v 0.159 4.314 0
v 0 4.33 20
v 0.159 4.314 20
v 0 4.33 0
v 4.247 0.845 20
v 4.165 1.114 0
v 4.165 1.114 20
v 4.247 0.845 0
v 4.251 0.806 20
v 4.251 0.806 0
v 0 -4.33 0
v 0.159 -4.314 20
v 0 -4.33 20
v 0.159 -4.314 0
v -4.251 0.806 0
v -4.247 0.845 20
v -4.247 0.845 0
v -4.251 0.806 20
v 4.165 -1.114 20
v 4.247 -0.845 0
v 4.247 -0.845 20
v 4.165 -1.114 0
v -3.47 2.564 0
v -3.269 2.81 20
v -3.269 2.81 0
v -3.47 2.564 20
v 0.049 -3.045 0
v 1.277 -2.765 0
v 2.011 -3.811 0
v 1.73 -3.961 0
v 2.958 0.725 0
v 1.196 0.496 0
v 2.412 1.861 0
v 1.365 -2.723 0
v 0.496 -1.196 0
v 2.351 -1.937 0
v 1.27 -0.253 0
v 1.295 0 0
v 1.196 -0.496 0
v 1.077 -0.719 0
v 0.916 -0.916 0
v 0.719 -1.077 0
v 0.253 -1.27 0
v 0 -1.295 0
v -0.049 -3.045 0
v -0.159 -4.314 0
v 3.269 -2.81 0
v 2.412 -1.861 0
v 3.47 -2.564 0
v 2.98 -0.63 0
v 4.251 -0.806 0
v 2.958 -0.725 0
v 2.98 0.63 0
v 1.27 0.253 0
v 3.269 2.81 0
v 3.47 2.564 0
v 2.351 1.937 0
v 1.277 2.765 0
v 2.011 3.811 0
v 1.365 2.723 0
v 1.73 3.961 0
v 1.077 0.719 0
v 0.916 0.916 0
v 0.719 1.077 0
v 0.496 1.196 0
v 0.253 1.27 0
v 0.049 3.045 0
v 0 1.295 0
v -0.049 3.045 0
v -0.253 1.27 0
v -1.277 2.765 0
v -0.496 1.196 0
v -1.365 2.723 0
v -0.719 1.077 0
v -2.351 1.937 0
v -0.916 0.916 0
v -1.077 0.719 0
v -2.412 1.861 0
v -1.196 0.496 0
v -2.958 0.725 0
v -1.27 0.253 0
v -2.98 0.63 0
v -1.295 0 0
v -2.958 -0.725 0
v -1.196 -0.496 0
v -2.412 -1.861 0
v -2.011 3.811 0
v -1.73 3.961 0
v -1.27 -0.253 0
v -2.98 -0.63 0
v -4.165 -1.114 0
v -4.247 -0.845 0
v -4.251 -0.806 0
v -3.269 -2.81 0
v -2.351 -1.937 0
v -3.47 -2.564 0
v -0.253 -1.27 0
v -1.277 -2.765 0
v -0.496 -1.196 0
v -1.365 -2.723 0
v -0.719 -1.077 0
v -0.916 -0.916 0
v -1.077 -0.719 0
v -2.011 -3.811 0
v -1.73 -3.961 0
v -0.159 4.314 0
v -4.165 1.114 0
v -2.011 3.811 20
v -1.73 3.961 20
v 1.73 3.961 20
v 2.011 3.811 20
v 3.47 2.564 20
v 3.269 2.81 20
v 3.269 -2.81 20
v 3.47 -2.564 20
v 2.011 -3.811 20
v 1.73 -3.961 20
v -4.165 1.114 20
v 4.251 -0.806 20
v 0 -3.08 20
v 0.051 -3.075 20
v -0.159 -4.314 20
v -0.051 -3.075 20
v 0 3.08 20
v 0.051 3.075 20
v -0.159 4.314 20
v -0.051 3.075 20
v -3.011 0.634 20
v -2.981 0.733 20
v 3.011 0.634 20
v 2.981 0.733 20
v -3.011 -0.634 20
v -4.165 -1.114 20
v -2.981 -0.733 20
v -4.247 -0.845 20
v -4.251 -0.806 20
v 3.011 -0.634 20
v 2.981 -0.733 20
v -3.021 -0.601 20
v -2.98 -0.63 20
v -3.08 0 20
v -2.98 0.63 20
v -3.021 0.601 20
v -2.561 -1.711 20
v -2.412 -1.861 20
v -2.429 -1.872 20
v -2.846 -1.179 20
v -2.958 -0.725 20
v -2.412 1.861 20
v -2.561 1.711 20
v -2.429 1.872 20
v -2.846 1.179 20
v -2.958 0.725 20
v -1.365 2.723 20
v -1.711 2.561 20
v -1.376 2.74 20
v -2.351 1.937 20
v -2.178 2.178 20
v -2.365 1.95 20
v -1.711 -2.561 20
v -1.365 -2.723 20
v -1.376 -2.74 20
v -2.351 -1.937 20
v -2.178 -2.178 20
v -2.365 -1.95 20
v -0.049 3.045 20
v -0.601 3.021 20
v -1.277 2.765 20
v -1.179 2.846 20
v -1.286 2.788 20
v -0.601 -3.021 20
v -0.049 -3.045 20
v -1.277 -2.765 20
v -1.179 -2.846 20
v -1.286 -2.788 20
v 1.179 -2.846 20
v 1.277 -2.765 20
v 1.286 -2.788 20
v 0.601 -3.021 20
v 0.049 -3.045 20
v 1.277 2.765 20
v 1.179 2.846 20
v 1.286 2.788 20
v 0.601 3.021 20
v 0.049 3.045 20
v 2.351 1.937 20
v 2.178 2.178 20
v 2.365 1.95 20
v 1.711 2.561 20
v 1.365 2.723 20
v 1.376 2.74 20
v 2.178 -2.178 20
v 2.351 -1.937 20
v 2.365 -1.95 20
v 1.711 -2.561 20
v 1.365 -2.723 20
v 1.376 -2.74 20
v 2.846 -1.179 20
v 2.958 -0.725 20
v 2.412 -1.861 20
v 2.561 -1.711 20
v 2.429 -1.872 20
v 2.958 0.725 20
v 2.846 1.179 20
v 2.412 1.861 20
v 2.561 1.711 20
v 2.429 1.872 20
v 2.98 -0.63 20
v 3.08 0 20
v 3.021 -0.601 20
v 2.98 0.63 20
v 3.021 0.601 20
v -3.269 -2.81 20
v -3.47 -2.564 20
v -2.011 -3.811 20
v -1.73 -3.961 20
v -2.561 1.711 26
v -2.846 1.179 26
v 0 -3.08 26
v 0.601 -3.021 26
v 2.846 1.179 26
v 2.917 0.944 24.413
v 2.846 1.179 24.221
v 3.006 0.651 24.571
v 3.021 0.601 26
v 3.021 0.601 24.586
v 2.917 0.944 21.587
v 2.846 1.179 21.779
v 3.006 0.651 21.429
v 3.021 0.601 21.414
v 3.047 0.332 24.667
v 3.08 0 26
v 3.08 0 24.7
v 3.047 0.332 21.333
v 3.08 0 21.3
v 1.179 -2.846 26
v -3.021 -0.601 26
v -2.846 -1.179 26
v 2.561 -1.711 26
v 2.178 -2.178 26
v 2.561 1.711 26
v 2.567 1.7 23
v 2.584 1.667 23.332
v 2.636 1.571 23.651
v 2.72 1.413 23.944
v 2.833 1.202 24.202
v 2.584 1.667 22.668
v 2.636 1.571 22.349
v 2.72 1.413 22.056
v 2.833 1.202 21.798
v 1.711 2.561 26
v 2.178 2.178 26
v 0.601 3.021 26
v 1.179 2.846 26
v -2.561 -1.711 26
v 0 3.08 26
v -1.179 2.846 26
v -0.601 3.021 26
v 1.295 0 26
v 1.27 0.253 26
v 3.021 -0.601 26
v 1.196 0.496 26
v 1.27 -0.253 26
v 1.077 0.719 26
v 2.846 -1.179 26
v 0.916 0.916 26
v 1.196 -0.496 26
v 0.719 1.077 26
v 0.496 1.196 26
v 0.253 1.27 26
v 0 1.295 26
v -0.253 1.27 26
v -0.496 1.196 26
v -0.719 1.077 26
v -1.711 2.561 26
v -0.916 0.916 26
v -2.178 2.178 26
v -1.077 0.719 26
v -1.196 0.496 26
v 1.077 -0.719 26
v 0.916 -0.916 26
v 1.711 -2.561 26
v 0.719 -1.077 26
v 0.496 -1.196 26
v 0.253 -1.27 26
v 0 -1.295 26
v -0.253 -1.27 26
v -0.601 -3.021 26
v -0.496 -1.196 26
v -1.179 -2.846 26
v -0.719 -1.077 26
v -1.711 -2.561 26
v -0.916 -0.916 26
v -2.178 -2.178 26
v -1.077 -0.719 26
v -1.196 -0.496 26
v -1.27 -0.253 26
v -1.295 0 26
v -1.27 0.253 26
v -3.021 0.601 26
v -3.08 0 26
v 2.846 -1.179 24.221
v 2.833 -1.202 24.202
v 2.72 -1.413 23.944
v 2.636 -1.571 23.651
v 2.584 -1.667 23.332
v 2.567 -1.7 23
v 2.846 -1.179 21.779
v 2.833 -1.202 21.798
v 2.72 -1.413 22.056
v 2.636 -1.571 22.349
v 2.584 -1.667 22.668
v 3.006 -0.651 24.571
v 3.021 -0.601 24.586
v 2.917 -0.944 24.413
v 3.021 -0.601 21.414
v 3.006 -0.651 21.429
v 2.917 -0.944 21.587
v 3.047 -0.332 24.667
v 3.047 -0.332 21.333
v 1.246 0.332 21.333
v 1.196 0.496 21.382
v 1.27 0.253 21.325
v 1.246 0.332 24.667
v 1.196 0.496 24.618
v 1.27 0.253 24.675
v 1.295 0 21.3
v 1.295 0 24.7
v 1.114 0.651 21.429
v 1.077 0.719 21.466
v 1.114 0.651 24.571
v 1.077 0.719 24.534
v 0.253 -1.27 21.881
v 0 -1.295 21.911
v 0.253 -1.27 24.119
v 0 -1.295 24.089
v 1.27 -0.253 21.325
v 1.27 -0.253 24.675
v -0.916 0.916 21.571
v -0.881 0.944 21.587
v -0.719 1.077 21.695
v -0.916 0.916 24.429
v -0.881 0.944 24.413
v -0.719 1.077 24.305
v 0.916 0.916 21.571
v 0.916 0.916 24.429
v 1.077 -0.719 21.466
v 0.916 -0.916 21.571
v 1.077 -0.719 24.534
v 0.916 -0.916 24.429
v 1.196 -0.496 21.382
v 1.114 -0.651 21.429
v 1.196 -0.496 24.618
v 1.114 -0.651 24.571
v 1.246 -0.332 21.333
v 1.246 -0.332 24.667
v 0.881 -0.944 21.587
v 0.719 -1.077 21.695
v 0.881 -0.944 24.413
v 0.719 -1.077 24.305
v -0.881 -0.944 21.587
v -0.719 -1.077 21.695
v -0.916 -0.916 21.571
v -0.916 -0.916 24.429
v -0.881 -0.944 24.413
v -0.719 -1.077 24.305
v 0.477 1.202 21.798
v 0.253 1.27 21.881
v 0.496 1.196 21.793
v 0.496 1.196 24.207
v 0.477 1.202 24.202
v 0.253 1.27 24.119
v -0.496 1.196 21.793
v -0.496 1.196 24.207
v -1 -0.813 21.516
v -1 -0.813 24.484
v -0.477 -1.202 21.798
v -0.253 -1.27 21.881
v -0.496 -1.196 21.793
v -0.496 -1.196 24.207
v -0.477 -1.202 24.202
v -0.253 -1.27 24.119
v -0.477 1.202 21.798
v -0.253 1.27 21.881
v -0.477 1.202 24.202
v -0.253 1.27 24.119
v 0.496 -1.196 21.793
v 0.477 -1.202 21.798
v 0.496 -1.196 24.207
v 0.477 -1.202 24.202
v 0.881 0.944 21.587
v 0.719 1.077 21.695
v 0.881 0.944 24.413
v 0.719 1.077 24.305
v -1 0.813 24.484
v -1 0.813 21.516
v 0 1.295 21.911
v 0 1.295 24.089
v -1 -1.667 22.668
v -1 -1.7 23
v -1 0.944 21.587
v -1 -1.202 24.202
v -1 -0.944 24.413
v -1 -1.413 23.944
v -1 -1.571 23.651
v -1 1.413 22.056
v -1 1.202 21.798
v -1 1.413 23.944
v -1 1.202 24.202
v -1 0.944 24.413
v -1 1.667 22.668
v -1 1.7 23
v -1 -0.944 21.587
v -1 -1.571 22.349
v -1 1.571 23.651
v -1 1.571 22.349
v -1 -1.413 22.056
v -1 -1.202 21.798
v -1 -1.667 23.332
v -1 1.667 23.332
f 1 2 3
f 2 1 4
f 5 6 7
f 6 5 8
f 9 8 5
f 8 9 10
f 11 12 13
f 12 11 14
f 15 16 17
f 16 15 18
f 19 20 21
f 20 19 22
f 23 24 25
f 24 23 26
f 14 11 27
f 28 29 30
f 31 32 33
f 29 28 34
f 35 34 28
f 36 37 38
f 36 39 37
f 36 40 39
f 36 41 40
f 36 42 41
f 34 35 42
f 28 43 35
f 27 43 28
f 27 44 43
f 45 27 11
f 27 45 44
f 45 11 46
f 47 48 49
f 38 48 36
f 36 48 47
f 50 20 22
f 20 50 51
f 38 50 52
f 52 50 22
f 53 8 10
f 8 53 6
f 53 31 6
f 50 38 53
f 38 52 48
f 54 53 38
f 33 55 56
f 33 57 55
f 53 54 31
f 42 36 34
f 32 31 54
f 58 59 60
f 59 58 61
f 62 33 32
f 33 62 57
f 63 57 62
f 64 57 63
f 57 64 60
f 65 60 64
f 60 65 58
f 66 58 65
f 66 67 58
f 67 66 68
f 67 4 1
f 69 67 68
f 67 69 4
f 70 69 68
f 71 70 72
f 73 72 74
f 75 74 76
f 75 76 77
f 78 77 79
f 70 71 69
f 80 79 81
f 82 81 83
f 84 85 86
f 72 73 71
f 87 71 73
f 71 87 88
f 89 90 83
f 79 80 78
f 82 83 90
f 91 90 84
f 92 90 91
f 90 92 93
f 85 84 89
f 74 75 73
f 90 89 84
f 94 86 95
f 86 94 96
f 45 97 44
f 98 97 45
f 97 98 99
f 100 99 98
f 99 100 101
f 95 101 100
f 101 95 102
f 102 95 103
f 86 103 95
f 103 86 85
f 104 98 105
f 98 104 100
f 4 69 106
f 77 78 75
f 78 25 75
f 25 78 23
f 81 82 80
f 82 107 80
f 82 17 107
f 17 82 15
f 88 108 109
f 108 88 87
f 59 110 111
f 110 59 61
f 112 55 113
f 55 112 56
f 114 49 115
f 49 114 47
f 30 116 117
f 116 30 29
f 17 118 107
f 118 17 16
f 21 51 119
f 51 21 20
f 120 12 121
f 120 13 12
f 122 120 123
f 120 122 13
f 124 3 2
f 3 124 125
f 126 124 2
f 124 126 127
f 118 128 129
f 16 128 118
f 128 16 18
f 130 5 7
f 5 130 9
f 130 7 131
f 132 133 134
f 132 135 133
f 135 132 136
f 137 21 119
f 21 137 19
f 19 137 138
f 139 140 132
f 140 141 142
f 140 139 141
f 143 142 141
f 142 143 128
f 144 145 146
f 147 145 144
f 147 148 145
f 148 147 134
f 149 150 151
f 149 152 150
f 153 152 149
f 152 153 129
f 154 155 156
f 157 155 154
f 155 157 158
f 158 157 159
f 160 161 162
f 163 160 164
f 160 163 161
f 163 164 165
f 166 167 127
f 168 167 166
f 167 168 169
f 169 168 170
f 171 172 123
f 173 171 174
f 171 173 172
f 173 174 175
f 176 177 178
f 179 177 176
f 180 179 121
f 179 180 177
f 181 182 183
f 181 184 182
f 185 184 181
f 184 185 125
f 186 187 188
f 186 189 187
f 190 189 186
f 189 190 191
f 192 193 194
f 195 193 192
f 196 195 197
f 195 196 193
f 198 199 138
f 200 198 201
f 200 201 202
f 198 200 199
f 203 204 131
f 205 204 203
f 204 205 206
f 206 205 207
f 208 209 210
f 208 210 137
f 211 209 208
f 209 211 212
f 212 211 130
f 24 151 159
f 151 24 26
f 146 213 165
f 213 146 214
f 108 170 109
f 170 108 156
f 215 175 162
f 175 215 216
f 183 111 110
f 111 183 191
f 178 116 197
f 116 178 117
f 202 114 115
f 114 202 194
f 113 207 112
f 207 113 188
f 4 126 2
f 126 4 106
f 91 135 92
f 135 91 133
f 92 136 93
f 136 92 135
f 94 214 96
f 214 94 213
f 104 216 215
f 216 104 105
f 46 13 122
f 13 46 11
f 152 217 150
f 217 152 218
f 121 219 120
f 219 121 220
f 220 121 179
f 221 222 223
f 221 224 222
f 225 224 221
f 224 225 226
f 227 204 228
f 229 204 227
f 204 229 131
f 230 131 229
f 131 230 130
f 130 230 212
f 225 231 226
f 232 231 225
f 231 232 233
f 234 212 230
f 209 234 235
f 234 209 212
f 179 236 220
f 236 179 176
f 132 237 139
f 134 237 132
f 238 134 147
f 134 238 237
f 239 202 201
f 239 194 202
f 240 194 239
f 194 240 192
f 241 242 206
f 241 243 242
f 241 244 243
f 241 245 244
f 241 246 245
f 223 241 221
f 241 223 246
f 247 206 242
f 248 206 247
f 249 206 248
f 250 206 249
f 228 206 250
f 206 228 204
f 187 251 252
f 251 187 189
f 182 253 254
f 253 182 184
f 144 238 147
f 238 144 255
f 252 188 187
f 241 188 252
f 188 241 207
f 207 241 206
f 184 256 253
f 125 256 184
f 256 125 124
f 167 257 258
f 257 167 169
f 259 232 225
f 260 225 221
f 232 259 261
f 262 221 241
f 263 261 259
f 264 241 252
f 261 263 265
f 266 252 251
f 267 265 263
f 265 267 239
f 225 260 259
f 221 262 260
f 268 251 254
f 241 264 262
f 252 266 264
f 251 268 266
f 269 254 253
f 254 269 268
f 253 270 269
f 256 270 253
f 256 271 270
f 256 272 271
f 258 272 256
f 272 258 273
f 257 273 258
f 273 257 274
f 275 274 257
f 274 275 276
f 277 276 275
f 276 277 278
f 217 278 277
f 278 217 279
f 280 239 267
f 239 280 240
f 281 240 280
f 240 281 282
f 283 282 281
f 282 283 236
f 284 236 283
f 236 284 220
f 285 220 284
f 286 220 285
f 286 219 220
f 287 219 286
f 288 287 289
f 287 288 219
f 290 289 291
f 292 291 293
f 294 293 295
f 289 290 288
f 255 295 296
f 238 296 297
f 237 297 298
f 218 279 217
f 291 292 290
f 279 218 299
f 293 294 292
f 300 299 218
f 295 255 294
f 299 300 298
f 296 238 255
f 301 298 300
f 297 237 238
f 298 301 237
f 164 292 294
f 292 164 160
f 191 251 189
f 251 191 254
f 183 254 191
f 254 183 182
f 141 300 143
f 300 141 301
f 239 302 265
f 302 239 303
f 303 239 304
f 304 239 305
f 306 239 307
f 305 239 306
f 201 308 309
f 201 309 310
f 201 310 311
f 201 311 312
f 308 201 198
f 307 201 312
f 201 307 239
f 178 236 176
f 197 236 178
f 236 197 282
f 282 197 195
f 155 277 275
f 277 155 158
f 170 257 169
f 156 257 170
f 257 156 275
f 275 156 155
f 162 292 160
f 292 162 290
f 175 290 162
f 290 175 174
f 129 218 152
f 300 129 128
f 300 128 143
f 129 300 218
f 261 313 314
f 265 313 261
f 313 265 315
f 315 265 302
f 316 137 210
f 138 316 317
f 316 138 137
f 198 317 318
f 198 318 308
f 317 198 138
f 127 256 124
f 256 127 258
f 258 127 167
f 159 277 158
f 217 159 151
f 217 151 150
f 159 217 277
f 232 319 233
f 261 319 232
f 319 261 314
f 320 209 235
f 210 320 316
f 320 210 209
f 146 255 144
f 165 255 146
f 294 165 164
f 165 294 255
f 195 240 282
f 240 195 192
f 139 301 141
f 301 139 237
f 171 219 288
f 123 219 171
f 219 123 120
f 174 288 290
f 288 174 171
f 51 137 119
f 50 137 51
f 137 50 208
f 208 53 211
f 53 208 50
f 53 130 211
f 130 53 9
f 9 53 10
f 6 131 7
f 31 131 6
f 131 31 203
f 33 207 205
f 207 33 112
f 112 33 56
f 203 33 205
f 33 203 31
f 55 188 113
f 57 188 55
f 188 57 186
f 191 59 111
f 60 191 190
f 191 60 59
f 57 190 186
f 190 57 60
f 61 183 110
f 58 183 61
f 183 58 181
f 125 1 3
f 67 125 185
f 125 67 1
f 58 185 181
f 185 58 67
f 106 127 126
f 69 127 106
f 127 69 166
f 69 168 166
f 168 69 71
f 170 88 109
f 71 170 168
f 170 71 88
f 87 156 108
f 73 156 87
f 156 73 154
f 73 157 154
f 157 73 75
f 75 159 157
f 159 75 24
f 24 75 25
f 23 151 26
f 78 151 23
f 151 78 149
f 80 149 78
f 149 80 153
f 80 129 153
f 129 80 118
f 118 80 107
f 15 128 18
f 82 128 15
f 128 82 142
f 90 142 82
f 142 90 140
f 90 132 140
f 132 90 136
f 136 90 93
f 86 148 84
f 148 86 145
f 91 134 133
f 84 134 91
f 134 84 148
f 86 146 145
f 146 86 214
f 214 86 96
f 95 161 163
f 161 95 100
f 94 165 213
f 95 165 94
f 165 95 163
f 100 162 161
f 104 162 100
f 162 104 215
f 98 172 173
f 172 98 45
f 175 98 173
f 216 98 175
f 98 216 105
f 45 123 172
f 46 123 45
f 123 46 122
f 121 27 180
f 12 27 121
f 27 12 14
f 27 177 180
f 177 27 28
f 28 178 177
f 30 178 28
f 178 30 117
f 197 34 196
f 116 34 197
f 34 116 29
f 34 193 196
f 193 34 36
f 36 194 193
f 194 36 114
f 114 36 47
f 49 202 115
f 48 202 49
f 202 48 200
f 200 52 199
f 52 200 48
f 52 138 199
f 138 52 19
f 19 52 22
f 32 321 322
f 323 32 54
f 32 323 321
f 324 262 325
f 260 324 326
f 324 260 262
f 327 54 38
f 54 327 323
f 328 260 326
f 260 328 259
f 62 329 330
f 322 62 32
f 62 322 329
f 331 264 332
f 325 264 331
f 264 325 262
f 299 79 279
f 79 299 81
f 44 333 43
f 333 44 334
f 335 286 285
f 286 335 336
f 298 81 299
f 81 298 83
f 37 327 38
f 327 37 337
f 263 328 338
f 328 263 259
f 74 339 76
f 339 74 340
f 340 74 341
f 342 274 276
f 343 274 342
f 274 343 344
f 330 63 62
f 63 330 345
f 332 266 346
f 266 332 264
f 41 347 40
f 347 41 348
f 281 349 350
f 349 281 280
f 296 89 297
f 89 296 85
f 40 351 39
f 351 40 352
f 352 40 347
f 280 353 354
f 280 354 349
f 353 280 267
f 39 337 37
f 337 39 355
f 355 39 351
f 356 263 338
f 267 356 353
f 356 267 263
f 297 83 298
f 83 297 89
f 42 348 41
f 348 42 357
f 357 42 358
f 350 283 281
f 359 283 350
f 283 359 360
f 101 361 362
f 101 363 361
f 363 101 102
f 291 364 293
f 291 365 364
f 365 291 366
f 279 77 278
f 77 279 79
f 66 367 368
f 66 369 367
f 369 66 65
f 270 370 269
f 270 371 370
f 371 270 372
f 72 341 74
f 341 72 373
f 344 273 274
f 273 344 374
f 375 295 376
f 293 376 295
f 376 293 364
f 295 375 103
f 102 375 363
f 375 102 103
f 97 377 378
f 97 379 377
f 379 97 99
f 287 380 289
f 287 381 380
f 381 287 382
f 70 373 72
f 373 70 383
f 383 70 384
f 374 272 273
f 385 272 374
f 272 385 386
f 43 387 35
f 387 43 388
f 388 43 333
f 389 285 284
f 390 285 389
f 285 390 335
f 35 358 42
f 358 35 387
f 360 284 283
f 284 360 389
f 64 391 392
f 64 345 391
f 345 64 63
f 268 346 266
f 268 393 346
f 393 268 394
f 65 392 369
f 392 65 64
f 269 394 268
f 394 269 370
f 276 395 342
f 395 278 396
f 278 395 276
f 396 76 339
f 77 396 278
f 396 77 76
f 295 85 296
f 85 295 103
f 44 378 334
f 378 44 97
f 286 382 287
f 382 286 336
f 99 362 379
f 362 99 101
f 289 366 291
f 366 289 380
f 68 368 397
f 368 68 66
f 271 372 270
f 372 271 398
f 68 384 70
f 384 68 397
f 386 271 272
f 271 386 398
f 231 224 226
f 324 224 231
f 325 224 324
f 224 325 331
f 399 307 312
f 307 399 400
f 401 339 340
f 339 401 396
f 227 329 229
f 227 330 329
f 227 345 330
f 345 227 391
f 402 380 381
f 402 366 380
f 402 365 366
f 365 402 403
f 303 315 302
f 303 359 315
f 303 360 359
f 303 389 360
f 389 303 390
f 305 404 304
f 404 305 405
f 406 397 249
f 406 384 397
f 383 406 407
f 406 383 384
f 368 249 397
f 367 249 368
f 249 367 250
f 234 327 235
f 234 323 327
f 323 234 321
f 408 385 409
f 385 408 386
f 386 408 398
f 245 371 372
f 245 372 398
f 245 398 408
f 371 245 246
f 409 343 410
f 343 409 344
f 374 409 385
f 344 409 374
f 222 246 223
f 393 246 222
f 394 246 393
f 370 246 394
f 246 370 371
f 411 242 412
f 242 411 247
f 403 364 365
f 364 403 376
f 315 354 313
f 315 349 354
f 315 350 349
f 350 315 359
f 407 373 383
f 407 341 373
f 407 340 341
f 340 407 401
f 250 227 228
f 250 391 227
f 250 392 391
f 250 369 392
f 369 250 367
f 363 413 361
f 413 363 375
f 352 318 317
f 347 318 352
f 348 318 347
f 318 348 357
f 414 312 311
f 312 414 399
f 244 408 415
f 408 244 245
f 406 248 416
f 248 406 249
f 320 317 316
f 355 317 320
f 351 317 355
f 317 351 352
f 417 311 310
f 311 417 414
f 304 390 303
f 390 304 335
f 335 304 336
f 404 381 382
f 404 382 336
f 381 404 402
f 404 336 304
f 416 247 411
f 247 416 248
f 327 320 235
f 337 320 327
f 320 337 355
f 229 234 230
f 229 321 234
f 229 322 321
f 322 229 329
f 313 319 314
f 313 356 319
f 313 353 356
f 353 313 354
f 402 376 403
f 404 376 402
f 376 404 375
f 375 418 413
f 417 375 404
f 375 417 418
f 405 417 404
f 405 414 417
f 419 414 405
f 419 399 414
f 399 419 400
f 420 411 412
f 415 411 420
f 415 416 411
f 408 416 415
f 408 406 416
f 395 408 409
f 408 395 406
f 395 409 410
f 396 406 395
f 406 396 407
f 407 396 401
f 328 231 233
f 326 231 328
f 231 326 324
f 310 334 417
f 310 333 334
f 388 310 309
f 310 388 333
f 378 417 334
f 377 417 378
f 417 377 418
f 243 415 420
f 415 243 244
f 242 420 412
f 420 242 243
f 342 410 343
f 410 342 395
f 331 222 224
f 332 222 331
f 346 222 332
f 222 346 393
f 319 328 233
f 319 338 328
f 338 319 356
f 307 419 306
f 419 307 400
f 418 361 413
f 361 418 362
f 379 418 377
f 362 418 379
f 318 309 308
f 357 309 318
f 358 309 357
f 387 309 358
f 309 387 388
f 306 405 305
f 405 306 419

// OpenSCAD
$fn = 32;

// ----------------------------------------------------------------------
// Timing pulley: GT2 14T, pitch 2 mm, 8.66 mm x 26 mm
// ----------------------------------------------------------------------

// --- parameters (mm) ---
pitch_mm = 2;             // belt pitch
tooth_count = 14;         // number of grooves
width = 20;               // belt width between the flanges
tip_d = 8.66;             // tip circle diameter
root_d = 7.16;            // groove bottom diameter
groove_h = 0.75;          // groove depth
tooth_w = 1.5;            // groove width at the tip circle
hub_bore = 2.59;          // shaft bore
hub_d = 6.16;             // hub diameter
hub_h = 6;                // hub above the flange
bottom_z = 0;             // lowest point of the pulley
top_z = 26;               // highest point of the pulley
set_d = 3.4;              // set screw tap hole

module rim() {
  cylinder(h = width, d = tip_d);
}

module groove_cutter() {
  /* belt tooth groove: deeper than wide, cut through the belt width */
  translate([root_d / 2, 0, 0])
    linear_extrude(height = width)
      polygon(points = [[-0.6, -tooth_w * 0.42], [groove_h + 0.6, -tooth_w * 0.6],
                        [groove_h + 0.6, tooth_w * 0.6], [-0.6, tooth_w * 0.42]]);
}

module hub() {
  translate([0, 0, bottom_z]) cylinder(h = top_z - bottom_z, d = hub_d);
}

difference() {
  union() {
    rim();
    hub();
  }
  for (i = [0 : tooth_count - 1]) rotate([0, 0, i * 360 / tooth_count]) groove_cutter();
  translate([0, 0, bottom_z - 1]) cylinder(h = top_z - bottom_z + 2, d = hub_bore);
  translate([-1, 0, top_z - hub_h * 0.5]) rotate([0, 90, 0]) cylinder(h = hub_d / 2 + 3, d = set_d);
}
